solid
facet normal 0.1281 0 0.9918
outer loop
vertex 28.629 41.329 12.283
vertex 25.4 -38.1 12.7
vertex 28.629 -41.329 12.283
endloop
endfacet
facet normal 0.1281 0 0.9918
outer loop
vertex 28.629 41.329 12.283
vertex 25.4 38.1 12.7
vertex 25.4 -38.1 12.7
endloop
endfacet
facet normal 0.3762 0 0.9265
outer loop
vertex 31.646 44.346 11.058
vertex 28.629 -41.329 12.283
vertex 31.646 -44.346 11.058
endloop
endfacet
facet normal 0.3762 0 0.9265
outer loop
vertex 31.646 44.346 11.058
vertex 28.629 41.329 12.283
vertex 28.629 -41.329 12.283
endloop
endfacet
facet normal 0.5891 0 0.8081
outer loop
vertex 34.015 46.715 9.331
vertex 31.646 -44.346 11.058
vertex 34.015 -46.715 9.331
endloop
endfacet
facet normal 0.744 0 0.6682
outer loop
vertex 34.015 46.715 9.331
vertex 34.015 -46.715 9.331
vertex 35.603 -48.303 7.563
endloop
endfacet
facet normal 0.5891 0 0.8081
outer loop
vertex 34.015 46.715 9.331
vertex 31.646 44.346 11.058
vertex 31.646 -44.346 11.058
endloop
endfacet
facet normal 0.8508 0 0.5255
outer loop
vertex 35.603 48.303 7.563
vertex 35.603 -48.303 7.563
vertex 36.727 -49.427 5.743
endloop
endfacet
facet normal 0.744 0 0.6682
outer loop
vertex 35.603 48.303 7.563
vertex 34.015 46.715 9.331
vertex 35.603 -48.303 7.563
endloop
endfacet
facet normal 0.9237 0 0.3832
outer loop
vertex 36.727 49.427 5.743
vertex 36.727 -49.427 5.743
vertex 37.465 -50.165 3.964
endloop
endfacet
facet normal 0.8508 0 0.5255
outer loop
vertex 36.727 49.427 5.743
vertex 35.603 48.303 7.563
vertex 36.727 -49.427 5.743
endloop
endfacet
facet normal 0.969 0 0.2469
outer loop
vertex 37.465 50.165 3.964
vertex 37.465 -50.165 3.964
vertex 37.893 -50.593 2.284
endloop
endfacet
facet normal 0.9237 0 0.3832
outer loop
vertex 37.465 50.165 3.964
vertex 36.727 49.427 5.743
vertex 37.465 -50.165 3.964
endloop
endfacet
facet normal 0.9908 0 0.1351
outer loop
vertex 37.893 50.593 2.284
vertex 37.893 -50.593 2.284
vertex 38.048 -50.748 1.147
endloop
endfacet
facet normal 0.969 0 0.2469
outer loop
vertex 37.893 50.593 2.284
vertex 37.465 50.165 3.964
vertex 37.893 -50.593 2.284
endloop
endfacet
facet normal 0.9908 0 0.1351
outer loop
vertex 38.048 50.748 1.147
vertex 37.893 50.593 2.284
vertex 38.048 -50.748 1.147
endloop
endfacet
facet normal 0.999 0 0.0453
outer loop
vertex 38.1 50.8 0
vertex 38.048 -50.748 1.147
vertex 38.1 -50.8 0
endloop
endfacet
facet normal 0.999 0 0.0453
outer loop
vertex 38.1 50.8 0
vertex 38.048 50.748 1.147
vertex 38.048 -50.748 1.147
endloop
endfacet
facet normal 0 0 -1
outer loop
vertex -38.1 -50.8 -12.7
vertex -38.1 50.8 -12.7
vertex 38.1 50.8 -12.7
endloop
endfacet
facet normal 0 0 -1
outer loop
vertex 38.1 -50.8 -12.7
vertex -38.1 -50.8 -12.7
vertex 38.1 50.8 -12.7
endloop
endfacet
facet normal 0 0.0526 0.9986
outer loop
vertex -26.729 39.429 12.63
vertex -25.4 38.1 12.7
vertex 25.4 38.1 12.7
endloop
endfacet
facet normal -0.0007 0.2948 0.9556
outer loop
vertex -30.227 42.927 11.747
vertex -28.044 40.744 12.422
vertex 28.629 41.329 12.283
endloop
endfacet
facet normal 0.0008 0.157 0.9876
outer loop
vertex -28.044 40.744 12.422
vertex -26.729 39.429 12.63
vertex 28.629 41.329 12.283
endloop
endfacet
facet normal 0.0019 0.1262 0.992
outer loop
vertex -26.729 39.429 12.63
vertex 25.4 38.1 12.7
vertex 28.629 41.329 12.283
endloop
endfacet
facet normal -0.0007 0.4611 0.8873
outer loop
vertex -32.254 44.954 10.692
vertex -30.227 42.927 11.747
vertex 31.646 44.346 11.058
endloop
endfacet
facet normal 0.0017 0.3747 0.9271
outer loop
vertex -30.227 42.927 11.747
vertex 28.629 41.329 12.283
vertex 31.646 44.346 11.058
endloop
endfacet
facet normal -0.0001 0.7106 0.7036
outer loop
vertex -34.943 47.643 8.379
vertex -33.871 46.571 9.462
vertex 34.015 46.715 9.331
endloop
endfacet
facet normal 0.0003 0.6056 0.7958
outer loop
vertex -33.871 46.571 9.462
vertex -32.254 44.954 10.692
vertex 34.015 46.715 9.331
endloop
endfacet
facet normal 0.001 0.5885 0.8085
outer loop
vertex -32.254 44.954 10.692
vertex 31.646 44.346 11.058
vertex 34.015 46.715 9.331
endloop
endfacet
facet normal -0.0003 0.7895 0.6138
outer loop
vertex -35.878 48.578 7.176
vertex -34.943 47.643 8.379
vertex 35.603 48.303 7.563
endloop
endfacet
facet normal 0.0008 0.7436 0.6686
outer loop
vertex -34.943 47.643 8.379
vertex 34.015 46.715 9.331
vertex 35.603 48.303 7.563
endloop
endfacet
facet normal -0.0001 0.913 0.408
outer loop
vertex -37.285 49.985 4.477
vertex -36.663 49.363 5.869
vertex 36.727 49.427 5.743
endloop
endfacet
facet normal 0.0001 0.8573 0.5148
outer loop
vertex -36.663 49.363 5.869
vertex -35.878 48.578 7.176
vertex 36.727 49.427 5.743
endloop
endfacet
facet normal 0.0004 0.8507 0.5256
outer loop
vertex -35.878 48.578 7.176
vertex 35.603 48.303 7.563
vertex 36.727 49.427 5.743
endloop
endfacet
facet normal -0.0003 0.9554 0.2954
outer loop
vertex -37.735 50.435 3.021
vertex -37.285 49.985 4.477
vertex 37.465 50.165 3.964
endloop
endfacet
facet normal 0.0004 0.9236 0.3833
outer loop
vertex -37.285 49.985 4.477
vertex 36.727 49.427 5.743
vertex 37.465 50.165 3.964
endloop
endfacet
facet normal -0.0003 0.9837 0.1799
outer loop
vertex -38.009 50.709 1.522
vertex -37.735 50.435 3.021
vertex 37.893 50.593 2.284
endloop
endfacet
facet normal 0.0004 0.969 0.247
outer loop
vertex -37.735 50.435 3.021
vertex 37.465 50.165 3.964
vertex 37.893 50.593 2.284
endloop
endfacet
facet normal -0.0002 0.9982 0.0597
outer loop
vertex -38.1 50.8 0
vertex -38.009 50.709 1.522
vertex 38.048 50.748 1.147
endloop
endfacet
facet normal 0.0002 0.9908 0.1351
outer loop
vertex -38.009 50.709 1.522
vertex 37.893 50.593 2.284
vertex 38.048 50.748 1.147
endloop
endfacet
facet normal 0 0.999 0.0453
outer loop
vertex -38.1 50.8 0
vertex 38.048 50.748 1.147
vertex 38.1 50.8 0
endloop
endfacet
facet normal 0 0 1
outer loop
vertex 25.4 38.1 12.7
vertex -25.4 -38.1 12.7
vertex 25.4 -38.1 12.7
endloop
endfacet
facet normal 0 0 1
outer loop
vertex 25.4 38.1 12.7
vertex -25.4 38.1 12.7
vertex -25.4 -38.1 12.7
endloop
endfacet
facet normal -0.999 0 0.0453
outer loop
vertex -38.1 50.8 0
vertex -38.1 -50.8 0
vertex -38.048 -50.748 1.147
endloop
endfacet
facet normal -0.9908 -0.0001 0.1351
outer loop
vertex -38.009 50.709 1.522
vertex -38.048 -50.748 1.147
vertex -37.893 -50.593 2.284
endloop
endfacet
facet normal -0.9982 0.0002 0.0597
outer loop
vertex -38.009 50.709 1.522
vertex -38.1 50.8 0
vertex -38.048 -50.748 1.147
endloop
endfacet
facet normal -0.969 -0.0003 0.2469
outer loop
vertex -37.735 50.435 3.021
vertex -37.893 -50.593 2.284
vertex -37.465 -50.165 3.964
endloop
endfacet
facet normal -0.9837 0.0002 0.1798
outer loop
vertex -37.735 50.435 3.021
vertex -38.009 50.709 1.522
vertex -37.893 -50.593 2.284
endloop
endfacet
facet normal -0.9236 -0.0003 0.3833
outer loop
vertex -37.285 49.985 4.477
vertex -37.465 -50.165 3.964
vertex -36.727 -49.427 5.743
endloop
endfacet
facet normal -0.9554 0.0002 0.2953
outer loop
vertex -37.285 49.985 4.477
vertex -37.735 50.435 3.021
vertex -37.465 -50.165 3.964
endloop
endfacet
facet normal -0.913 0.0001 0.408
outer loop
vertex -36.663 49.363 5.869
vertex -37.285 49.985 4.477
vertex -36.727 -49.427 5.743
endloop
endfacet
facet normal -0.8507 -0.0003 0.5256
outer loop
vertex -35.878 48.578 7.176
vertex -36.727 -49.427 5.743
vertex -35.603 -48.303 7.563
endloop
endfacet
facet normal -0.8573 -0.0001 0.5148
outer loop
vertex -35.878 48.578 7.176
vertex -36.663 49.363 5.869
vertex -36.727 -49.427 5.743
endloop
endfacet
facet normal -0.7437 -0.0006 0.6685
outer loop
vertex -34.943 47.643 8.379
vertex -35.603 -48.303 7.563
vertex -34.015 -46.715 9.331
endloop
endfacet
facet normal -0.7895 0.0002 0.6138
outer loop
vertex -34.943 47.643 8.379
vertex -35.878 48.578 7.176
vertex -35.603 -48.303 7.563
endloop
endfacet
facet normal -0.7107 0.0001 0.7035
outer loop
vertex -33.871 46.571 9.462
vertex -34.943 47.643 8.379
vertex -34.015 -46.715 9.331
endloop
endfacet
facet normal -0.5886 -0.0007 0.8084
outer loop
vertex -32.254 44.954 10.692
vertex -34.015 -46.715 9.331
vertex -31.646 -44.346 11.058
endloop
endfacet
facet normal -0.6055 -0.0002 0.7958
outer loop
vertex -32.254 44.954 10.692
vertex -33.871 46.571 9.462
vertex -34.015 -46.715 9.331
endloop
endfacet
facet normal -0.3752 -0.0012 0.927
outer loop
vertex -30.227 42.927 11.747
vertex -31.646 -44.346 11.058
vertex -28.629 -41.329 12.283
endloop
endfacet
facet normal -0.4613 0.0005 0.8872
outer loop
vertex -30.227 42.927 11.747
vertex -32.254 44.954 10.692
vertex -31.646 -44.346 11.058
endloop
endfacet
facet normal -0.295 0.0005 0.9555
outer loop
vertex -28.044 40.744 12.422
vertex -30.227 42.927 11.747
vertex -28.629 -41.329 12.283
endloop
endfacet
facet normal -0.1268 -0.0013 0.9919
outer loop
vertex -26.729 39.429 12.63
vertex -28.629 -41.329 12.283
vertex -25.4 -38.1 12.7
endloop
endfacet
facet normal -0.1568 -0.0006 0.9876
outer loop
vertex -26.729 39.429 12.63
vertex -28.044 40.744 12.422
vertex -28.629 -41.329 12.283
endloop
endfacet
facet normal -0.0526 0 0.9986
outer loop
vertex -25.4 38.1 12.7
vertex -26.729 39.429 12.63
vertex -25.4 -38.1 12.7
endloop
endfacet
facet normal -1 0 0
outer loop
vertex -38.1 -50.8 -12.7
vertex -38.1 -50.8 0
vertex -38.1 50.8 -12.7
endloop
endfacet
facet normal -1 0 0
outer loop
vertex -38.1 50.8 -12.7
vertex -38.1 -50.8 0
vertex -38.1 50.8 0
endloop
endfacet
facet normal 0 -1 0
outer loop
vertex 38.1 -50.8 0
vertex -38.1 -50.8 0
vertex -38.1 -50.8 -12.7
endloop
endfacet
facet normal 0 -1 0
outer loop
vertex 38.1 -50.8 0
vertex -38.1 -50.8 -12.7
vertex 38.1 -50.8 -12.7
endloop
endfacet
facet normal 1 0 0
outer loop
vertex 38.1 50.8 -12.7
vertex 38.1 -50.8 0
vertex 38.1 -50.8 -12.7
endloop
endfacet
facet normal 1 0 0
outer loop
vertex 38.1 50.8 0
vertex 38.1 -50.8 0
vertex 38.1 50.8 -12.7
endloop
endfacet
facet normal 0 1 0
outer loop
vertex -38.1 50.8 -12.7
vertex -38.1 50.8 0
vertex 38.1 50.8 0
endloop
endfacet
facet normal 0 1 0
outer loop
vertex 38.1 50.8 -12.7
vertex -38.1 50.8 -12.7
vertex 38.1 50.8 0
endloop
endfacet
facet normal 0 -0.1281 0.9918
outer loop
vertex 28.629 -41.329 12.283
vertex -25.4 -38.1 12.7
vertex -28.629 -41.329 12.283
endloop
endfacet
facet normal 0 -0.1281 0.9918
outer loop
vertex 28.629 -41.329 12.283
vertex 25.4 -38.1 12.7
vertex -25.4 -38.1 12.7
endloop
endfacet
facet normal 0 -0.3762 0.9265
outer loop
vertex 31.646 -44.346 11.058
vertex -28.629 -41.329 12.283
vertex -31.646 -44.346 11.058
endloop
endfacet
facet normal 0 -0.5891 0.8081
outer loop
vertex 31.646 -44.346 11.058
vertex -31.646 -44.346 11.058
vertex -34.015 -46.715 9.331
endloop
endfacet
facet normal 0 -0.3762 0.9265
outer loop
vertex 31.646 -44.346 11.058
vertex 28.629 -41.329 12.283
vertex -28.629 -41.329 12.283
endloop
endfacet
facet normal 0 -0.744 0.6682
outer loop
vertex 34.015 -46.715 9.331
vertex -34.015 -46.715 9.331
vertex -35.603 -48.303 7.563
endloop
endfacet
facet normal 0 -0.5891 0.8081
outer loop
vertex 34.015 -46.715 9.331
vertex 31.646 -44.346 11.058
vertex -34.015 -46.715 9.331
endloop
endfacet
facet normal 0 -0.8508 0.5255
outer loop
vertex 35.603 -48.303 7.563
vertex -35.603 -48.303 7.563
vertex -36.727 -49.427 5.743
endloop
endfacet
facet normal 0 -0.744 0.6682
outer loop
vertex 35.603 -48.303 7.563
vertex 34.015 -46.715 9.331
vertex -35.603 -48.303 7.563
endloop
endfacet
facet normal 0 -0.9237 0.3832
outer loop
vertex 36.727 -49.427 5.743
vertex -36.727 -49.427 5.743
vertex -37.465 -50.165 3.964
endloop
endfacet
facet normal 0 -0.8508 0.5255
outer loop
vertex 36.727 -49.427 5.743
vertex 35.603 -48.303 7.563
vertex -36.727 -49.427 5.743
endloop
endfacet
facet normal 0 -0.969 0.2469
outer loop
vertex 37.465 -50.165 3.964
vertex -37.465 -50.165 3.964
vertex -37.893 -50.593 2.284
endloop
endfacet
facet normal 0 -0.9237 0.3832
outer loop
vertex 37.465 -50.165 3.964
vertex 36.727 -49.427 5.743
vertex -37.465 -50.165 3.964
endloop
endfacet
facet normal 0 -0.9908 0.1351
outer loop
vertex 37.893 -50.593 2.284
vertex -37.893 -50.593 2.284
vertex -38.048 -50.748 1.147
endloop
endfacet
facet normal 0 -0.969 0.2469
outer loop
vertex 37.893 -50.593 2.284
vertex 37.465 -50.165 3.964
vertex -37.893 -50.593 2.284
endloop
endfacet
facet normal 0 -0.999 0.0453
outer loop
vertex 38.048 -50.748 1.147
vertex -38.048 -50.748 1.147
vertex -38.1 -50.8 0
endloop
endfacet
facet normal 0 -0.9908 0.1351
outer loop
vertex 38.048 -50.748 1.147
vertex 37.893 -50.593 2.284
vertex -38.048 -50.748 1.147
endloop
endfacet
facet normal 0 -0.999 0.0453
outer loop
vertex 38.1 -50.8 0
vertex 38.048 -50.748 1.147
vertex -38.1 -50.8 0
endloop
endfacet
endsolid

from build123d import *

# Parameters (mm, degrees)
F0_W     = 76.2
F0_H     = 101.6
F1_DEPTH = 12.7
F2_R     = 12.7


with BuildPart() as f1:
    # F0 (on Top) → F1 (new body, symmetric)
    with BuildSketch(Plane.XY):
        Rectangle(F0_W, F0_H)
    extrude(amount=F1_DEPTH, both=True)

    # F2
    f2_edges = [f1.edges().sort_by_distance(p)[0] for p in [
        (0, -50.8, 12.7),
        (38.1, 0, 12.7),
        (-38.1, 0, 12.7),
        (0, 50.8, 12.7),
    ]]
    fillet(f2_edges, radius=F2_R)


solid = f1.part
